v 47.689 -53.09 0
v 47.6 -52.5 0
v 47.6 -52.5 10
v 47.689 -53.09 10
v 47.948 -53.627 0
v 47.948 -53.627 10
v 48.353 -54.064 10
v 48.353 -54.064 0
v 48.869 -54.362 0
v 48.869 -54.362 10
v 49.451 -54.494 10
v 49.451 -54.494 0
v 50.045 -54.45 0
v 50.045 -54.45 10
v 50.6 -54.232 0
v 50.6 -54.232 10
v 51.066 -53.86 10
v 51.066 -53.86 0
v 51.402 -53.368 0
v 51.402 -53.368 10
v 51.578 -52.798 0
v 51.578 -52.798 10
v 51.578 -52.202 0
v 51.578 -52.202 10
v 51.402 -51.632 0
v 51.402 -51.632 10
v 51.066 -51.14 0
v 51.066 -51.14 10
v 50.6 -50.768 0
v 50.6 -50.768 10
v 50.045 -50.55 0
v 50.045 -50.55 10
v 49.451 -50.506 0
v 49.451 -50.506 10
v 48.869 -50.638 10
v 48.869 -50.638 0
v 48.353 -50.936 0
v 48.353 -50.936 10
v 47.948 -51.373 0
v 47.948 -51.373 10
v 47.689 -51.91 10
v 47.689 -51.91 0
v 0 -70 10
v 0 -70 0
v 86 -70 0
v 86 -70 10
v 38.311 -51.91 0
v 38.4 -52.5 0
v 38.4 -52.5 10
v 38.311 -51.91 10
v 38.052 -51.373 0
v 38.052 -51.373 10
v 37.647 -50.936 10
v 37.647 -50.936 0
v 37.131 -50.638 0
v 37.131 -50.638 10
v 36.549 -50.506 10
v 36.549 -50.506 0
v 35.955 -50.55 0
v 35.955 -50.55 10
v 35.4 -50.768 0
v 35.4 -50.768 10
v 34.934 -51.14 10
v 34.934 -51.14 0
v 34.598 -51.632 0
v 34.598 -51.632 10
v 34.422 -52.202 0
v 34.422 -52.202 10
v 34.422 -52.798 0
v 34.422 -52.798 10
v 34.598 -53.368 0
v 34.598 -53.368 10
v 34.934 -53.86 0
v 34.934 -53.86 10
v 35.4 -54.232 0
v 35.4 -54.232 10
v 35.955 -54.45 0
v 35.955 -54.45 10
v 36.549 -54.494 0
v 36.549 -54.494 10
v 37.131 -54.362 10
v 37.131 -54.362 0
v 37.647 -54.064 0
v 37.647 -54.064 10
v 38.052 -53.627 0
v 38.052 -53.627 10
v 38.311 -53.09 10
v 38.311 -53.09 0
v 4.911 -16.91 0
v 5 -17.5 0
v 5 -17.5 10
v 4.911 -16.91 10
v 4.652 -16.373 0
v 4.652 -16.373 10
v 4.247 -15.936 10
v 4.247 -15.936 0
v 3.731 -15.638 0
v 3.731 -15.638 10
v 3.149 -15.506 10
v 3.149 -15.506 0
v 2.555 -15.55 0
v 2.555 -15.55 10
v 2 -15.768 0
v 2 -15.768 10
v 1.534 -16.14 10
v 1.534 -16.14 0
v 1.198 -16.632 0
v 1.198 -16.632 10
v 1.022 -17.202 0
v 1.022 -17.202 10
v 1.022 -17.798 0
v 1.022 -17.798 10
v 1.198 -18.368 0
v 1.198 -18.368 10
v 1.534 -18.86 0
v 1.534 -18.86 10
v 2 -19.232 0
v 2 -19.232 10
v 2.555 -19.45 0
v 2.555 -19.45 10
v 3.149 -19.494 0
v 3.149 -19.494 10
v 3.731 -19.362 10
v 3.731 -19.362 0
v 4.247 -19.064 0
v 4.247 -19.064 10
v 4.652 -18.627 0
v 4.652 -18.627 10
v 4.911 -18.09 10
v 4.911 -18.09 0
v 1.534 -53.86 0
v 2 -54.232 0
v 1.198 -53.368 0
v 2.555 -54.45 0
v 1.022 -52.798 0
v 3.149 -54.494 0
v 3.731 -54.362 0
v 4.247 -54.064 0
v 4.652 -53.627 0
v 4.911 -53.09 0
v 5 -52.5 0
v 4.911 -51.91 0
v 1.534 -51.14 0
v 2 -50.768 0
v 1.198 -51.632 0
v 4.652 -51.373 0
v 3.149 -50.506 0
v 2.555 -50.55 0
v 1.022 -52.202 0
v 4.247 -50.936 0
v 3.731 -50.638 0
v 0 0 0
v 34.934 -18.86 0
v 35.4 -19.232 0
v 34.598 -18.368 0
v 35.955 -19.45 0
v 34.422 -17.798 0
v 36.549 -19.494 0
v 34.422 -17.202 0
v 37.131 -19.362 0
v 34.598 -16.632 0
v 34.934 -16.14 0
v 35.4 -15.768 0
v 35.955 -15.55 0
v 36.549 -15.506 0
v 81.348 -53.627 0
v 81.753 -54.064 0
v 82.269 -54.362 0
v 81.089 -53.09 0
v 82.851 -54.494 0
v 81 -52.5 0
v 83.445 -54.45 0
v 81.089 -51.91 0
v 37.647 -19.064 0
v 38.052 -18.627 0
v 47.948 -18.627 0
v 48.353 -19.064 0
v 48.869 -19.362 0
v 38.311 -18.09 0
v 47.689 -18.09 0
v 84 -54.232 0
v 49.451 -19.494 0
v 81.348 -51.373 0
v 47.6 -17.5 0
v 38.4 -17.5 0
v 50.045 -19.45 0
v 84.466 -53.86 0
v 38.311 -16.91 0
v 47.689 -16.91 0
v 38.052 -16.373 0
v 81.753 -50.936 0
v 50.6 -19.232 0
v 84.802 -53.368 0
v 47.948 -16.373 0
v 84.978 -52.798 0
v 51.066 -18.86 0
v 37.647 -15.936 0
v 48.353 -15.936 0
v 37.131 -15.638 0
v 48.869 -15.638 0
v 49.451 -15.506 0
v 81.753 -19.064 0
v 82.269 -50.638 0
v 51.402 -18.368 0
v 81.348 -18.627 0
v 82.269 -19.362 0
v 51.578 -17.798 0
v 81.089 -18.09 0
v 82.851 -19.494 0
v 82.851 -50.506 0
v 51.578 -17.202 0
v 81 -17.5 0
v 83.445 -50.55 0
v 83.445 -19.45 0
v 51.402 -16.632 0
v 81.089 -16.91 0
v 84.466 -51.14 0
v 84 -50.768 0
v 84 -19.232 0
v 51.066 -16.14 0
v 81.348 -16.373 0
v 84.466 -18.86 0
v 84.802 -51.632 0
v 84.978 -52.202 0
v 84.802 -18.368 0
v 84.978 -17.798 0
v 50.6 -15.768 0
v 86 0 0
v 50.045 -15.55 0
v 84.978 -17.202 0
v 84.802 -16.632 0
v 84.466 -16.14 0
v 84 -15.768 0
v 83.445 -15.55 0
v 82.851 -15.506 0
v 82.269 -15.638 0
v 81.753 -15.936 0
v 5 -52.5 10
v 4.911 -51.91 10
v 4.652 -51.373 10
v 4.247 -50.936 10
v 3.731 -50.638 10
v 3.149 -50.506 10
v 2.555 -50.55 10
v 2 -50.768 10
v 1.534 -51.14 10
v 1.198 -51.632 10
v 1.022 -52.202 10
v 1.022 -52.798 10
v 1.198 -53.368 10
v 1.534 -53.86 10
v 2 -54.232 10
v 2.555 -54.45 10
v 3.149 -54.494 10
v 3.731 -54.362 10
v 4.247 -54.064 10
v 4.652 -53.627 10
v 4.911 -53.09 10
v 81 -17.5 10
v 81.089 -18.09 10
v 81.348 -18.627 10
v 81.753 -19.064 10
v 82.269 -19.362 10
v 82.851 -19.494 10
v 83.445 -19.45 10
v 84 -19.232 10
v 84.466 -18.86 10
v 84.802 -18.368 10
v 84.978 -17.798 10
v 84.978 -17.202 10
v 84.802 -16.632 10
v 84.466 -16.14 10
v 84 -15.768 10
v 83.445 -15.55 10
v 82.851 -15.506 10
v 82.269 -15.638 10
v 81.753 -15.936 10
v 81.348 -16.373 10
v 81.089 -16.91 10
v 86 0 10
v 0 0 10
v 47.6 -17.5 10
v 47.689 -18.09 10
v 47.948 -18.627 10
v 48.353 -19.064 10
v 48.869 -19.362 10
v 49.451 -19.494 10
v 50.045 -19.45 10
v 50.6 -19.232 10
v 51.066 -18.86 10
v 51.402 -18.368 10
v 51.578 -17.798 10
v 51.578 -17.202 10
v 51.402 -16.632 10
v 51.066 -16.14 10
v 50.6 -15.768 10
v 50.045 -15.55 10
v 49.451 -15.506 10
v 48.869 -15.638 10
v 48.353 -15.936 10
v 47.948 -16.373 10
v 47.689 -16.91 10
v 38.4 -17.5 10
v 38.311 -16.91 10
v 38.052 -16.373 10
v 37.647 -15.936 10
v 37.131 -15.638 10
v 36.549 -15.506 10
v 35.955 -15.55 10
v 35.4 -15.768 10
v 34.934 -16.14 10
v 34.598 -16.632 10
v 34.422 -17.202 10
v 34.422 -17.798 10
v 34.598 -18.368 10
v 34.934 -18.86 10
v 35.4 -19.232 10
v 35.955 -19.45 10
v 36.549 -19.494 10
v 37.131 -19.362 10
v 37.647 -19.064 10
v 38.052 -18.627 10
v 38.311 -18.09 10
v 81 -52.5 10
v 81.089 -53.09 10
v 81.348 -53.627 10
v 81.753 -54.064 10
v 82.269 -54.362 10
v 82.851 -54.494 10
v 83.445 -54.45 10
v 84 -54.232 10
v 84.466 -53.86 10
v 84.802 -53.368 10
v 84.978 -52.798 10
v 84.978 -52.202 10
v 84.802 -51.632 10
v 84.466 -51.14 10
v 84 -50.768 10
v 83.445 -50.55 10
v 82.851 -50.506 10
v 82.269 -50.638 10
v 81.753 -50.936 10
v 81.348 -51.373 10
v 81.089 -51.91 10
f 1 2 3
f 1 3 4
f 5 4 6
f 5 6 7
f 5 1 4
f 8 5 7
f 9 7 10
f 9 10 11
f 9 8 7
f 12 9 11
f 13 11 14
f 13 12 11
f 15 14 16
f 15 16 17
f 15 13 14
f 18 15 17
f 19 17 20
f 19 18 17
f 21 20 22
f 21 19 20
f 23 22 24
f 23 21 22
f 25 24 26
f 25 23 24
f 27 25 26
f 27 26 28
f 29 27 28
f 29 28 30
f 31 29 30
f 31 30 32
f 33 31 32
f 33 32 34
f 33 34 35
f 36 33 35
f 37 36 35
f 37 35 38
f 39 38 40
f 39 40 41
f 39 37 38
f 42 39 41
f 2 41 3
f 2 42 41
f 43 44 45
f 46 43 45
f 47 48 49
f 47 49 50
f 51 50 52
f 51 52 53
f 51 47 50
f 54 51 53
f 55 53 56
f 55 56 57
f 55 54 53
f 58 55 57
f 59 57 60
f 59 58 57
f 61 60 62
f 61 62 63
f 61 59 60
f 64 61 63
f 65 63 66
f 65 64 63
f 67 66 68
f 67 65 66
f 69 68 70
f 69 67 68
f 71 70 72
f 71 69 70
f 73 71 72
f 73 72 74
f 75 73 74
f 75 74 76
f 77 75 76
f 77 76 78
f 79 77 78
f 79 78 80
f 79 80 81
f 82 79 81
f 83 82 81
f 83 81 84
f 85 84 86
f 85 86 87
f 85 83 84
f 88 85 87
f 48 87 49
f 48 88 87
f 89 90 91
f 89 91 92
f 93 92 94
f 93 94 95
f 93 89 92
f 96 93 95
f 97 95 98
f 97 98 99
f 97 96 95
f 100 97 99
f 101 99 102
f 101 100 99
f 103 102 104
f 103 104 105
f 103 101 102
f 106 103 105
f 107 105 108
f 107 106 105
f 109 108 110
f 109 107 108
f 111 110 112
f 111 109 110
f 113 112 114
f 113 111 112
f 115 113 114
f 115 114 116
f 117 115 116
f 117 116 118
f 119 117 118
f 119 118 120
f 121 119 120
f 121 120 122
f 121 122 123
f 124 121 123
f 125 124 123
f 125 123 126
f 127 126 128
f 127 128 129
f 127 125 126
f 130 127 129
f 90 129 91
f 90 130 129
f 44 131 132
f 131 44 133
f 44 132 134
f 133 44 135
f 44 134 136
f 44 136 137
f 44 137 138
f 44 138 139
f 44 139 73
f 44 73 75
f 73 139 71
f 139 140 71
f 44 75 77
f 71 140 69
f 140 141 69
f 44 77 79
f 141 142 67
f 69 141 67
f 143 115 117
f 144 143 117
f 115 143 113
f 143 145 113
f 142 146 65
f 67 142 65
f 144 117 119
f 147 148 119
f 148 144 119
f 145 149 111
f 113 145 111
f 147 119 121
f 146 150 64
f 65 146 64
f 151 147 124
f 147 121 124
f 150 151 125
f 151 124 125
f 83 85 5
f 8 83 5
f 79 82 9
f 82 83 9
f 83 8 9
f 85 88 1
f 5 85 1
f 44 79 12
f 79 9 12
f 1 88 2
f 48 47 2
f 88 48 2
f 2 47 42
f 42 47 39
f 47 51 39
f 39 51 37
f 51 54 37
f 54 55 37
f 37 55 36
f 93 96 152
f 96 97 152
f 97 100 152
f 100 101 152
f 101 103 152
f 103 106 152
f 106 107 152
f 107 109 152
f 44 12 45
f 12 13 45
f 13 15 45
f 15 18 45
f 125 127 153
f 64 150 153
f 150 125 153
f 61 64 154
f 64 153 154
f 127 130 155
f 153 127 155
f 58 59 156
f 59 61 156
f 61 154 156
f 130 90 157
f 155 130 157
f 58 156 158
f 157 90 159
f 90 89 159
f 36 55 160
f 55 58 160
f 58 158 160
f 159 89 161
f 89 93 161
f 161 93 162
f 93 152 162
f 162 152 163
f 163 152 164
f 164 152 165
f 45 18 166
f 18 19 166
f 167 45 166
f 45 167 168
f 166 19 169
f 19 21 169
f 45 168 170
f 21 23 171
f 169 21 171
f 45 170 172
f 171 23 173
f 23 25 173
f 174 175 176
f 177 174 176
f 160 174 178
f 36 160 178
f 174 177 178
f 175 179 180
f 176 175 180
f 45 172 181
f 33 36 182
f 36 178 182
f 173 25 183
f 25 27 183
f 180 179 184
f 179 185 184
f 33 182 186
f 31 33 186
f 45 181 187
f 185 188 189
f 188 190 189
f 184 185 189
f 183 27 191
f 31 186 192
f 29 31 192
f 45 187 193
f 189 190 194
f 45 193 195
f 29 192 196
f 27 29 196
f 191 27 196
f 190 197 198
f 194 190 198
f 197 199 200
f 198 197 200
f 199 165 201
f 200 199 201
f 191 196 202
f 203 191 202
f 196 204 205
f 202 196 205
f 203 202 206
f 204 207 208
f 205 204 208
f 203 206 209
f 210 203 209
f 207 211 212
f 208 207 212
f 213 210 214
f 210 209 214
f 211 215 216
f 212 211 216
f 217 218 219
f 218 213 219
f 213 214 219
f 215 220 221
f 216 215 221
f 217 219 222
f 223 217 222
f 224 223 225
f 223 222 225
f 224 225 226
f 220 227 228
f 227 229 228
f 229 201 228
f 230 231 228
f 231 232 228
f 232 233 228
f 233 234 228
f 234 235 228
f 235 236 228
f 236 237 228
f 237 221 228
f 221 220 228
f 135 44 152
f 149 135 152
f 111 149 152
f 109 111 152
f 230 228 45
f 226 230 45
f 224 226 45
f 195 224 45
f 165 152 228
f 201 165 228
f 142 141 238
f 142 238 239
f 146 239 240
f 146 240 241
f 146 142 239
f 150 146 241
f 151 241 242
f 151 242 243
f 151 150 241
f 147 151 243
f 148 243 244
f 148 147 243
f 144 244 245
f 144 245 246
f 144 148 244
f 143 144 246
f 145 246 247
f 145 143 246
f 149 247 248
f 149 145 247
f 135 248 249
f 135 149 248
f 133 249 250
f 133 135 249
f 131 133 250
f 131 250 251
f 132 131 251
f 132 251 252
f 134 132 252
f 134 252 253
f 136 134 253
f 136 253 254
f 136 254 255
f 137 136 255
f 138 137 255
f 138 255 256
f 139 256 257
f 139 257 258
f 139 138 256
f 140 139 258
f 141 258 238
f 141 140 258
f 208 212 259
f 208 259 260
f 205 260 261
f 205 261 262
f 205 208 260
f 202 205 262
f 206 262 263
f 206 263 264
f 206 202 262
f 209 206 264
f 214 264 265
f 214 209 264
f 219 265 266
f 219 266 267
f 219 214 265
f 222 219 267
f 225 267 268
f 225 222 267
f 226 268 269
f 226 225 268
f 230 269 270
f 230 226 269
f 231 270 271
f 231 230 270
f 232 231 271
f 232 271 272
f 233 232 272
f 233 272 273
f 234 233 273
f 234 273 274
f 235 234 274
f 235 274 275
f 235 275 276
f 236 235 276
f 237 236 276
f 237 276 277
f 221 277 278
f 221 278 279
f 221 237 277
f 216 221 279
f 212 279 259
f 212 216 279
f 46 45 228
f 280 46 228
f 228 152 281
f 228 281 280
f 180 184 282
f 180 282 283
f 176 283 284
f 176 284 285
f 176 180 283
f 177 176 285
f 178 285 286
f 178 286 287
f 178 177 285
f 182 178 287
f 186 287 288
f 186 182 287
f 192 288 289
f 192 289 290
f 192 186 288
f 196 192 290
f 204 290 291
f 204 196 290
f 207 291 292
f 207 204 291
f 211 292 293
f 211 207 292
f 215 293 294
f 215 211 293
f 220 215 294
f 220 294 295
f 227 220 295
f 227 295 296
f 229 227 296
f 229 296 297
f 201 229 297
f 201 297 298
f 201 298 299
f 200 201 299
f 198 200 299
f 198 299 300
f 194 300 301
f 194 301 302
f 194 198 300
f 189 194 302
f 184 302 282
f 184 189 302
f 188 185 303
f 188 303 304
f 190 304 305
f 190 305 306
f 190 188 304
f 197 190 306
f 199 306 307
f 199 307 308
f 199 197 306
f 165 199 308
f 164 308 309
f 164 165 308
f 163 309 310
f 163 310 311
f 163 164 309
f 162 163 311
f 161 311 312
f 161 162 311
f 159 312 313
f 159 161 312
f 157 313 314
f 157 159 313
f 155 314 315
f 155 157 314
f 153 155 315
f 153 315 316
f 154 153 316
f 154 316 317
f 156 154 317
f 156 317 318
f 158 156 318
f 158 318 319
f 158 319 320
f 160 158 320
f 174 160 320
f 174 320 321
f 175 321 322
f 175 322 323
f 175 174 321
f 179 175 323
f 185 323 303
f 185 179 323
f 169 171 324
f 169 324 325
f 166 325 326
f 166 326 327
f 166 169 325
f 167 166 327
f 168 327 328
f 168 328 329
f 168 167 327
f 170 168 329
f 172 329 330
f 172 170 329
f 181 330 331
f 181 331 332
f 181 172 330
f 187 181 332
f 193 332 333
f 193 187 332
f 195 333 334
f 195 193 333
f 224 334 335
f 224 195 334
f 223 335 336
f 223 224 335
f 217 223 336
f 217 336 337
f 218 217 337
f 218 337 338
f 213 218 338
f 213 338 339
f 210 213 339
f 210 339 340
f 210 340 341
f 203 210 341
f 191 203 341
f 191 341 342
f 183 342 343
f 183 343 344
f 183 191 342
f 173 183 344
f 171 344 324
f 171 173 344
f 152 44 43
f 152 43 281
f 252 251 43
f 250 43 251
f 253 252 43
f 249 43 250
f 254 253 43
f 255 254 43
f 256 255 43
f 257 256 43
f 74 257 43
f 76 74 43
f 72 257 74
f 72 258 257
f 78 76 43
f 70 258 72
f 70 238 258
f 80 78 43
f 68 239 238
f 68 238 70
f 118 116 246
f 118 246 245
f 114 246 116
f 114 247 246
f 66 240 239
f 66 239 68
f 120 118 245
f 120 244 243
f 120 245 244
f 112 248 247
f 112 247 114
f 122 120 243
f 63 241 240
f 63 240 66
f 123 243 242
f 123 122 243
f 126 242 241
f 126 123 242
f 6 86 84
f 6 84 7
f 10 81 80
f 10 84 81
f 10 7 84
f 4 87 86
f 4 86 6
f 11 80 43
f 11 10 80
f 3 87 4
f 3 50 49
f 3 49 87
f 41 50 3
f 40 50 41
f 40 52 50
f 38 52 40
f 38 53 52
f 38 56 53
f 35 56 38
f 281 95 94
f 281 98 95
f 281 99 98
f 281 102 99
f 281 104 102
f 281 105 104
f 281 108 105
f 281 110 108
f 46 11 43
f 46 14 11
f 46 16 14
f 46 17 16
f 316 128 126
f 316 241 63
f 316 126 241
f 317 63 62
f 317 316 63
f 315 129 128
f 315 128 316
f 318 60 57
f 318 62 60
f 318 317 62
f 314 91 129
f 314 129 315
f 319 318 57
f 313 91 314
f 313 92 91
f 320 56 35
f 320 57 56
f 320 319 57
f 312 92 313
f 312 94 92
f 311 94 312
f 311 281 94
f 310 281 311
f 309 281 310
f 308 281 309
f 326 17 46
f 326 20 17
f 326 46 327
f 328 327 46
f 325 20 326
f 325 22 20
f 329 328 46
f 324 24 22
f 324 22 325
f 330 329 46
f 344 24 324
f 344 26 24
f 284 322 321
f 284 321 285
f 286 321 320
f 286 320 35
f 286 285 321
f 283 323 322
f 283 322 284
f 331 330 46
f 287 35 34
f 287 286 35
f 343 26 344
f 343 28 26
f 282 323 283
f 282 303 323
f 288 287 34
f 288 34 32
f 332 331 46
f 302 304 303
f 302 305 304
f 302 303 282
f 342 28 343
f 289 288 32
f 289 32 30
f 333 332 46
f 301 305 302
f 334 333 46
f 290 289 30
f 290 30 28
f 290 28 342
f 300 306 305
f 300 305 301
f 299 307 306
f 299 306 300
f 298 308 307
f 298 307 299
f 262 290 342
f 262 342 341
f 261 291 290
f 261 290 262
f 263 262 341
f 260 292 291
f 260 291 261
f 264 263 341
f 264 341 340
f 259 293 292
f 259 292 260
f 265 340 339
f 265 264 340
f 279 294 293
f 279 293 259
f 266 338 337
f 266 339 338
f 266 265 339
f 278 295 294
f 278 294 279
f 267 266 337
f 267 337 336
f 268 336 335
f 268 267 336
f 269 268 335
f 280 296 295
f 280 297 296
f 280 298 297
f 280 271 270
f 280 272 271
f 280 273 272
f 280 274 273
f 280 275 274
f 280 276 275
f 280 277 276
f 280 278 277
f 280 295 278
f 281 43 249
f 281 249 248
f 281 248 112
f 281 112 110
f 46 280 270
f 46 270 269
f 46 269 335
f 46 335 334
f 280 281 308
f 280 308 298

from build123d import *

# Parameters (mm, degrees)
ESQUISSE1_W        = 86
ESQUISSE1_H        = 70
ESQUISSE1_R        = 2
BOSS_EXTRU_1_DEPTH = 10


with BuildPart() as part:
    # Esquisse1 → Boss.-Extru.1 (new body)
    with BuildSketch(Plane.XY):
        with Locations((43, -35)):
            Rectangle(ESQUISSE1_W, ESQUISSE1_H)
        with Locations((3, -17.5)):
            Circle(ESQUISSE1_R, mode=Mode.SUBTRACT)
        with Locations((3, -52.5)):
            Circle(ESQUISSE1_R, mode=Mode.SUBTRACT)
        with Locations((36.4, -52.5)):
            Circle(ESQUISSE1_R, mode=Mode.SUBTRACT)
        with Locations((36.4, -17.5)):
            Circle(ESQUISSE1_R, mode=Mode.SUBTRACT)
        with Locations(Location((49.6, -52.5, 0), (0, 0, 180))):
            Circle(ESQUISSE1_R, mode=Mode.SUBTRACT)
        with Locations(Location((83, -52.5, 0), (0, 0, 180))):
            Circle(ESQUISSE1_R, mode=Mode.SUBTRACT)
        with Locations(Location((83, -17.5, 0), (0, 0, 180))):
            Circle(ESQUISSE1_R, mode=Mode.SUBTRACT)
        with Locations(Location((49.6, -17.5, 0), (0, 0, 180))):
            Circle(ESQUISSE1_R, mode=Mode.SUBTRACT)
    extrude(amount=BOSS_EXTRU_1_DEPTH)


solid = part.part
